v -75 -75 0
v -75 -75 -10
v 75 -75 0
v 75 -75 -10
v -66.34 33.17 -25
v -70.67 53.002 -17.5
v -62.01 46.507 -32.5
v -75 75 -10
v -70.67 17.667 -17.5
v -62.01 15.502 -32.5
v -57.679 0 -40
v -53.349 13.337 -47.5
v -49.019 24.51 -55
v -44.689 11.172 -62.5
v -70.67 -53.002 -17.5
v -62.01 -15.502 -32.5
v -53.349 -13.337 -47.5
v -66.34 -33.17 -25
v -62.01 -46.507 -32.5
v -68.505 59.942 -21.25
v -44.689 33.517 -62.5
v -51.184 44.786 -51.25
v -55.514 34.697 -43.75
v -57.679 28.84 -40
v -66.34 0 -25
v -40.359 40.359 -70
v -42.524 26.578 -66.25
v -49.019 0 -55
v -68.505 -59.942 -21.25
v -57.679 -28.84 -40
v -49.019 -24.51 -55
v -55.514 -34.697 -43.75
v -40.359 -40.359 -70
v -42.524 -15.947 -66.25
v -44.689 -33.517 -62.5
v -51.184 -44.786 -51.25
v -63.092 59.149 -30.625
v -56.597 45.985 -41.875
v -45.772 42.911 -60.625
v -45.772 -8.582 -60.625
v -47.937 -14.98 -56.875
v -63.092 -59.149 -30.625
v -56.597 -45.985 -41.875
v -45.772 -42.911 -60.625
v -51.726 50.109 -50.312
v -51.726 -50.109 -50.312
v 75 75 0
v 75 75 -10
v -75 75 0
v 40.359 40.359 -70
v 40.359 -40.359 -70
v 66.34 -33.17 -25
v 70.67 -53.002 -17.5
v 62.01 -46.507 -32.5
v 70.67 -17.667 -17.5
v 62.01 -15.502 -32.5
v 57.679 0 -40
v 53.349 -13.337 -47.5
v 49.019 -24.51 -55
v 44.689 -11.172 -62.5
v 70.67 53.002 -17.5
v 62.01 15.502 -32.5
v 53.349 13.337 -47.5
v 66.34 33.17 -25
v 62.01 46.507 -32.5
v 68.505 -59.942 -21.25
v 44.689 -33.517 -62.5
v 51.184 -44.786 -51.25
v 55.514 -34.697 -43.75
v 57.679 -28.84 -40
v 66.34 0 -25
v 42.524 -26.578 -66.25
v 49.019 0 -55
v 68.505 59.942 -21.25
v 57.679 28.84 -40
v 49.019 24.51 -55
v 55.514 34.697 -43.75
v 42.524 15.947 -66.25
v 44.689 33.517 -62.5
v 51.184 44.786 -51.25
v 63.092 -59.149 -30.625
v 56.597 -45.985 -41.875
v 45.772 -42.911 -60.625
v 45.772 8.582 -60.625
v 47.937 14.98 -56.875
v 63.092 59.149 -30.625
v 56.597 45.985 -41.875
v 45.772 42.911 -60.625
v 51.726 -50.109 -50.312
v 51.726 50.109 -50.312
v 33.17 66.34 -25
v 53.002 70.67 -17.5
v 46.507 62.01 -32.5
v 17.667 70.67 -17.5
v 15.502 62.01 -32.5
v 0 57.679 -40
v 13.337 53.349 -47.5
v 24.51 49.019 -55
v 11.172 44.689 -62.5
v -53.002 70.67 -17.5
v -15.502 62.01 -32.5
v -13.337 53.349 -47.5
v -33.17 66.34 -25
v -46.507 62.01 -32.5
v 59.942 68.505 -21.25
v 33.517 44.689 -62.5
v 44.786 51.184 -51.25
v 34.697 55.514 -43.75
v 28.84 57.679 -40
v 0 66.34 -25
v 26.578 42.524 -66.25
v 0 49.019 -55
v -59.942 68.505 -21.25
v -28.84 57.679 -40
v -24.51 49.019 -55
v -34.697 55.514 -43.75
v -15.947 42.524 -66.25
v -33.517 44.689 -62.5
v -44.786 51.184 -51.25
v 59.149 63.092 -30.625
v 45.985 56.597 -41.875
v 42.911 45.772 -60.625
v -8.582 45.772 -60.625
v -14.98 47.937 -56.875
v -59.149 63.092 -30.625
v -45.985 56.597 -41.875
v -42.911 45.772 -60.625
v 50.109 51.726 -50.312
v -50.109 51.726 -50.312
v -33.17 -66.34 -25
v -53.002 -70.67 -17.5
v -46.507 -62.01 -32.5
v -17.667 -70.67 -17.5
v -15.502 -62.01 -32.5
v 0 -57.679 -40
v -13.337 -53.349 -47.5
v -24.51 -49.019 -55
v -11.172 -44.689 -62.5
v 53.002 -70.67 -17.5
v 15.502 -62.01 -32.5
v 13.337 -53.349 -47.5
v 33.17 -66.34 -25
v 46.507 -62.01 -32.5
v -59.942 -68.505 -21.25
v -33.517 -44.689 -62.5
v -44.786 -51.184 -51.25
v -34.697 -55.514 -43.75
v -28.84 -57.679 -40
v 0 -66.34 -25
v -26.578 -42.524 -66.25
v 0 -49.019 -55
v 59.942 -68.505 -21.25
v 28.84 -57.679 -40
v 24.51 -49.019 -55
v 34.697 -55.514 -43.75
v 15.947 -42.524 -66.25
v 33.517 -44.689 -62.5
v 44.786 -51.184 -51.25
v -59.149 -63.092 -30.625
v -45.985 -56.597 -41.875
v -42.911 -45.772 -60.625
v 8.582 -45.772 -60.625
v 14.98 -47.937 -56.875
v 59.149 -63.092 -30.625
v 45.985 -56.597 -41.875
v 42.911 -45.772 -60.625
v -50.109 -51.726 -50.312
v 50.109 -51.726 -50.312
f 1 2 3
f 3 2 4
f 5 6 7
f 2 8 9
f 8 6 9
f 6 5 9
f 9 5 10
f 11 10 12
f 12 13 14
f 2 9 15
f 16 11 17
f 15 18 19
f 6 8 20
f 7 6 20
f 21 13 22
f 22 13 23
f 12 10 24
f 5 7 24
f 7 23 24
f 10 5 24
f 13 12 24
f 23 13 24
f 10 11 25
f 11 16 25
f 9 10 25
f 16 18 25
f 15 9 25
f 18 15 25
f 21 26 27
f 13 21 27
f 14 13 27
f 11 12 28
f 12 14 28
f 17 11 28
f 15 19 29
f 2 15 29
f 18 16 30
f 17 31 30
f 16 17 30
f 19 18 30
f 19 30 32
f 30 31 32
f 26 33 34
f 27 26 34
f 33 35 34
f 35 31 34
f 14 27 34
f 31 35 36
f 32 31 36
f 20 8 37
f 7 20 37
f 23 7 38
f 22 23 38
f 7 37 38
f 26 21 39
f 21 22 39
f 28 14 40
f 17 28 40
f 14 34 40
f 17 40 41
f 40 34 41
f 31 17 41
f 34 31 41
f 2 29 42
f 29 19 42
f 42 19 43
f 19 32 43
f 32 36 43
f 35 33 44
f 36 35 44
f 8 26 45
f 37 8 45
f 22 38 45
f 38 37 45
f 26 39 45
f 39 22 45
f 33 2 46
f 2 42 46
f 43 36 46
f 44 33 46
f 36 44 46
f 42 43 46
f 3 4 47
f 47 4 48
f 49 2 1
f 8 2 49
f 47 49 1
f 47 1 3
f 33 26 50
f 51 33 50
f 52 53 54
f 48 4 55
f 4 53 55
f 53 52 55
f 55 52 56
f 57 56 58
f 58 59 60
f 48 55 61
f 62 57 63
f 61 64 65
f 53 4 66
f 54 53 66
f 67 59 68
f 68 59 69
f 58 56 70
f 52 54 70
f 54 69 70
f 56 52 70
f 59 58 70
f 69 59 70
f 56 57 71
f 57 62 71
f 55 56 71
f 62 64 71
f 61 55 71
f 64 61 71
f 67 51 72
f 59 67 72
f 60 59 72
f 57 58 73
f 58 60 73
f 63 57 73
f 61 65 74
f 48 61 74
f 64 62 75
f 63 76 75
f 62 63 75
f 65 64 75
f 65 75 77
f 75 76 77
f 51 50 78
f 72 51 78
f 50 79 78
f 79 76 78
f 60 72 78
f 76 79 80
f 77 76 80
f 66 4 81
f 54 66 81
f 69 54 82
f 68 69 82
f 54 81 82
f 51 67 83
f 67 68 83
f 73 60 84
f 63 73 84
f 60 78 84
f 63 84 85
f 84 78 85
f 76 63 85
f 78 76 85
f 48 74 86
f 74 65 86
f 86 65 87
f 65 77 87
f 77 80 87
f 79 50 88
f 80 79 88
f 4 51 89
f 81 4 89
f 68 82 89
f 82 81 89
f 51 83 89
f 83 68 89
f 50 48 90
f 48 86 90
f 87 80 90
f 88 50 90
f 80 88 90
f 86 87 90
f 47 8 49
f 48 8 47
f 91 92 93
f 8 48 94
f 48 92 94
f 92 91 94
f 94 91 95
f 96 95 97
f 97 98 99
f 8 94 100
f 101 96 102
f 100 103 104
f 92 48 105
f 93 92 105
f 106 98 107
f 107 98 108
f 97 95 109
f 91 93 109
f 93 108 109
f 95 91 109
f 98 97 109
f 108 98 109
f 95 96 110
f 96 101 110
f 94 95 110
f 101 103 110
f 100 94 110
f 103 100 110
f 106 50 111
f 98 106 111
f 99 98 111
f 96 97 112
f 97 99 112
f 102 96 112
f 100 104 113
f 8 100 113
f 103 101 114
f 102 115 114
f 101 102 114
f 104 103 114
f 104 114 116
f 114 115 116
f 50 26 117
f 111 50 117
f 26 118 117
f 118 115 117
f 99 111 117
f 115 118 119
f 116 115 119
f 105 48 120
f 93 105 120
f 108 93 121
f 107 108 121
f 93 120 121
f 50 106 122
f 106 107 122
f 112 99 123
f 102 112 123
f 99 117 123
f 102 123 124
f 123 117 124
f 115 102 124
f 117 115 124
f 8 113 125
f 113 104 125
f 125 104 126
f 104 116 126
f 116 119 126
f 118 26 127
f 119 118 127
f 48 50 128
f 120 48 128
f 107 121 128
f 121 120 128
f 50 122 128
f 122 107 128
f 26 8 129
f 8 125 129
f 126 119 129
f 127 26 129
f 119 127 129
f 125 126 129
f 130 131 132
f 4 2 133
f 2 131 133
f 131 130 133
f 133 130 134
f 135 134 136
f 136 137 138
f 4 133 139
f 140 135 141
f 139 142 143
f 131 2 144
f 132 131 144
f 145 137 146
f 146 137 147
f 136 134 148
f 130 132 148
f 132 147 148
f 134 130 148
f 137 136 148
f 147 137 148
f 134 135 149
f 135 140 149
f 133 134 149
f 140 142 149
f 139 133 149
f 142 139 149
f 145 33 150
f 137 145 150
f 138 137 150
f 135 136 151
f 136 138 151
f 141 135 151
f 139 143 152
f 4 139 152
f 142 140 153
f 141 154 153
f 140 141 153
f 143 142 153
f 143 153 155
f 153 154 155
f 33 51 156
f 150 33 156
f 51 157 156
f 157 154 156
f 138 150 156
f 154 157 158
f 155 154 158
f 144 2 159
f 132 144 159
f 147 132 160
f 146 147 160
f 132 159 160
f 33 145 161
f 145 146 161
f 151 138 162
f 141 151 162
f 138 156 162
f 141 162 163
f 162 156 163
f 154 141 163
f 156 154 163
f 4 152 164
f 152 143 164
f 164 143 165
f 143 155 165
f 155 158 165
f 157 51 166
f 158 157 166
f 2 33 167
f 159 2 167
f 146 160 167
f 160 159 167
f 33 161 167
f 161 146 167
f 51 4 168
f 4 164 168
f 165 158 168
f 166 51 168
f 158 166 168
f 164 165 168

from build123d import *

# Parameters (mm, degrees)
EXTRUDE1_START           = -10
SKETCH1_W                = 150
SKETCH1_H                = 150
EXTRUDE1_DEPTH           = 10
EXTRUDE1_OTHER_WAY_DEPTH = 60
EXTRUDE1_OTHER_WAY_TAPER = 30


with BuildPart() as part:
    # Sketch1 → Extrude1 (new body)
    with BuildSketch(Plane.XY.offset(EXTRUDE1_START)):
        Rectangle(SKETCH1_W, SKETCH1_H)
    extrude(amount=EXTRUDE1_DEPTH)

    # Sketch1 → Extrude1 other way (add)
    with BuildSketch(Plane.XY.offset(EXTRUDE1_START)):
        Rectangle(SKETCH1_W, SKETCH1_H)
    extrude(amount=-EXTRUDE1_OTHER_WAY_DEPTH, taper=EXTRUDE1_OTHER_WAY_TAPER)


solid = part.part
